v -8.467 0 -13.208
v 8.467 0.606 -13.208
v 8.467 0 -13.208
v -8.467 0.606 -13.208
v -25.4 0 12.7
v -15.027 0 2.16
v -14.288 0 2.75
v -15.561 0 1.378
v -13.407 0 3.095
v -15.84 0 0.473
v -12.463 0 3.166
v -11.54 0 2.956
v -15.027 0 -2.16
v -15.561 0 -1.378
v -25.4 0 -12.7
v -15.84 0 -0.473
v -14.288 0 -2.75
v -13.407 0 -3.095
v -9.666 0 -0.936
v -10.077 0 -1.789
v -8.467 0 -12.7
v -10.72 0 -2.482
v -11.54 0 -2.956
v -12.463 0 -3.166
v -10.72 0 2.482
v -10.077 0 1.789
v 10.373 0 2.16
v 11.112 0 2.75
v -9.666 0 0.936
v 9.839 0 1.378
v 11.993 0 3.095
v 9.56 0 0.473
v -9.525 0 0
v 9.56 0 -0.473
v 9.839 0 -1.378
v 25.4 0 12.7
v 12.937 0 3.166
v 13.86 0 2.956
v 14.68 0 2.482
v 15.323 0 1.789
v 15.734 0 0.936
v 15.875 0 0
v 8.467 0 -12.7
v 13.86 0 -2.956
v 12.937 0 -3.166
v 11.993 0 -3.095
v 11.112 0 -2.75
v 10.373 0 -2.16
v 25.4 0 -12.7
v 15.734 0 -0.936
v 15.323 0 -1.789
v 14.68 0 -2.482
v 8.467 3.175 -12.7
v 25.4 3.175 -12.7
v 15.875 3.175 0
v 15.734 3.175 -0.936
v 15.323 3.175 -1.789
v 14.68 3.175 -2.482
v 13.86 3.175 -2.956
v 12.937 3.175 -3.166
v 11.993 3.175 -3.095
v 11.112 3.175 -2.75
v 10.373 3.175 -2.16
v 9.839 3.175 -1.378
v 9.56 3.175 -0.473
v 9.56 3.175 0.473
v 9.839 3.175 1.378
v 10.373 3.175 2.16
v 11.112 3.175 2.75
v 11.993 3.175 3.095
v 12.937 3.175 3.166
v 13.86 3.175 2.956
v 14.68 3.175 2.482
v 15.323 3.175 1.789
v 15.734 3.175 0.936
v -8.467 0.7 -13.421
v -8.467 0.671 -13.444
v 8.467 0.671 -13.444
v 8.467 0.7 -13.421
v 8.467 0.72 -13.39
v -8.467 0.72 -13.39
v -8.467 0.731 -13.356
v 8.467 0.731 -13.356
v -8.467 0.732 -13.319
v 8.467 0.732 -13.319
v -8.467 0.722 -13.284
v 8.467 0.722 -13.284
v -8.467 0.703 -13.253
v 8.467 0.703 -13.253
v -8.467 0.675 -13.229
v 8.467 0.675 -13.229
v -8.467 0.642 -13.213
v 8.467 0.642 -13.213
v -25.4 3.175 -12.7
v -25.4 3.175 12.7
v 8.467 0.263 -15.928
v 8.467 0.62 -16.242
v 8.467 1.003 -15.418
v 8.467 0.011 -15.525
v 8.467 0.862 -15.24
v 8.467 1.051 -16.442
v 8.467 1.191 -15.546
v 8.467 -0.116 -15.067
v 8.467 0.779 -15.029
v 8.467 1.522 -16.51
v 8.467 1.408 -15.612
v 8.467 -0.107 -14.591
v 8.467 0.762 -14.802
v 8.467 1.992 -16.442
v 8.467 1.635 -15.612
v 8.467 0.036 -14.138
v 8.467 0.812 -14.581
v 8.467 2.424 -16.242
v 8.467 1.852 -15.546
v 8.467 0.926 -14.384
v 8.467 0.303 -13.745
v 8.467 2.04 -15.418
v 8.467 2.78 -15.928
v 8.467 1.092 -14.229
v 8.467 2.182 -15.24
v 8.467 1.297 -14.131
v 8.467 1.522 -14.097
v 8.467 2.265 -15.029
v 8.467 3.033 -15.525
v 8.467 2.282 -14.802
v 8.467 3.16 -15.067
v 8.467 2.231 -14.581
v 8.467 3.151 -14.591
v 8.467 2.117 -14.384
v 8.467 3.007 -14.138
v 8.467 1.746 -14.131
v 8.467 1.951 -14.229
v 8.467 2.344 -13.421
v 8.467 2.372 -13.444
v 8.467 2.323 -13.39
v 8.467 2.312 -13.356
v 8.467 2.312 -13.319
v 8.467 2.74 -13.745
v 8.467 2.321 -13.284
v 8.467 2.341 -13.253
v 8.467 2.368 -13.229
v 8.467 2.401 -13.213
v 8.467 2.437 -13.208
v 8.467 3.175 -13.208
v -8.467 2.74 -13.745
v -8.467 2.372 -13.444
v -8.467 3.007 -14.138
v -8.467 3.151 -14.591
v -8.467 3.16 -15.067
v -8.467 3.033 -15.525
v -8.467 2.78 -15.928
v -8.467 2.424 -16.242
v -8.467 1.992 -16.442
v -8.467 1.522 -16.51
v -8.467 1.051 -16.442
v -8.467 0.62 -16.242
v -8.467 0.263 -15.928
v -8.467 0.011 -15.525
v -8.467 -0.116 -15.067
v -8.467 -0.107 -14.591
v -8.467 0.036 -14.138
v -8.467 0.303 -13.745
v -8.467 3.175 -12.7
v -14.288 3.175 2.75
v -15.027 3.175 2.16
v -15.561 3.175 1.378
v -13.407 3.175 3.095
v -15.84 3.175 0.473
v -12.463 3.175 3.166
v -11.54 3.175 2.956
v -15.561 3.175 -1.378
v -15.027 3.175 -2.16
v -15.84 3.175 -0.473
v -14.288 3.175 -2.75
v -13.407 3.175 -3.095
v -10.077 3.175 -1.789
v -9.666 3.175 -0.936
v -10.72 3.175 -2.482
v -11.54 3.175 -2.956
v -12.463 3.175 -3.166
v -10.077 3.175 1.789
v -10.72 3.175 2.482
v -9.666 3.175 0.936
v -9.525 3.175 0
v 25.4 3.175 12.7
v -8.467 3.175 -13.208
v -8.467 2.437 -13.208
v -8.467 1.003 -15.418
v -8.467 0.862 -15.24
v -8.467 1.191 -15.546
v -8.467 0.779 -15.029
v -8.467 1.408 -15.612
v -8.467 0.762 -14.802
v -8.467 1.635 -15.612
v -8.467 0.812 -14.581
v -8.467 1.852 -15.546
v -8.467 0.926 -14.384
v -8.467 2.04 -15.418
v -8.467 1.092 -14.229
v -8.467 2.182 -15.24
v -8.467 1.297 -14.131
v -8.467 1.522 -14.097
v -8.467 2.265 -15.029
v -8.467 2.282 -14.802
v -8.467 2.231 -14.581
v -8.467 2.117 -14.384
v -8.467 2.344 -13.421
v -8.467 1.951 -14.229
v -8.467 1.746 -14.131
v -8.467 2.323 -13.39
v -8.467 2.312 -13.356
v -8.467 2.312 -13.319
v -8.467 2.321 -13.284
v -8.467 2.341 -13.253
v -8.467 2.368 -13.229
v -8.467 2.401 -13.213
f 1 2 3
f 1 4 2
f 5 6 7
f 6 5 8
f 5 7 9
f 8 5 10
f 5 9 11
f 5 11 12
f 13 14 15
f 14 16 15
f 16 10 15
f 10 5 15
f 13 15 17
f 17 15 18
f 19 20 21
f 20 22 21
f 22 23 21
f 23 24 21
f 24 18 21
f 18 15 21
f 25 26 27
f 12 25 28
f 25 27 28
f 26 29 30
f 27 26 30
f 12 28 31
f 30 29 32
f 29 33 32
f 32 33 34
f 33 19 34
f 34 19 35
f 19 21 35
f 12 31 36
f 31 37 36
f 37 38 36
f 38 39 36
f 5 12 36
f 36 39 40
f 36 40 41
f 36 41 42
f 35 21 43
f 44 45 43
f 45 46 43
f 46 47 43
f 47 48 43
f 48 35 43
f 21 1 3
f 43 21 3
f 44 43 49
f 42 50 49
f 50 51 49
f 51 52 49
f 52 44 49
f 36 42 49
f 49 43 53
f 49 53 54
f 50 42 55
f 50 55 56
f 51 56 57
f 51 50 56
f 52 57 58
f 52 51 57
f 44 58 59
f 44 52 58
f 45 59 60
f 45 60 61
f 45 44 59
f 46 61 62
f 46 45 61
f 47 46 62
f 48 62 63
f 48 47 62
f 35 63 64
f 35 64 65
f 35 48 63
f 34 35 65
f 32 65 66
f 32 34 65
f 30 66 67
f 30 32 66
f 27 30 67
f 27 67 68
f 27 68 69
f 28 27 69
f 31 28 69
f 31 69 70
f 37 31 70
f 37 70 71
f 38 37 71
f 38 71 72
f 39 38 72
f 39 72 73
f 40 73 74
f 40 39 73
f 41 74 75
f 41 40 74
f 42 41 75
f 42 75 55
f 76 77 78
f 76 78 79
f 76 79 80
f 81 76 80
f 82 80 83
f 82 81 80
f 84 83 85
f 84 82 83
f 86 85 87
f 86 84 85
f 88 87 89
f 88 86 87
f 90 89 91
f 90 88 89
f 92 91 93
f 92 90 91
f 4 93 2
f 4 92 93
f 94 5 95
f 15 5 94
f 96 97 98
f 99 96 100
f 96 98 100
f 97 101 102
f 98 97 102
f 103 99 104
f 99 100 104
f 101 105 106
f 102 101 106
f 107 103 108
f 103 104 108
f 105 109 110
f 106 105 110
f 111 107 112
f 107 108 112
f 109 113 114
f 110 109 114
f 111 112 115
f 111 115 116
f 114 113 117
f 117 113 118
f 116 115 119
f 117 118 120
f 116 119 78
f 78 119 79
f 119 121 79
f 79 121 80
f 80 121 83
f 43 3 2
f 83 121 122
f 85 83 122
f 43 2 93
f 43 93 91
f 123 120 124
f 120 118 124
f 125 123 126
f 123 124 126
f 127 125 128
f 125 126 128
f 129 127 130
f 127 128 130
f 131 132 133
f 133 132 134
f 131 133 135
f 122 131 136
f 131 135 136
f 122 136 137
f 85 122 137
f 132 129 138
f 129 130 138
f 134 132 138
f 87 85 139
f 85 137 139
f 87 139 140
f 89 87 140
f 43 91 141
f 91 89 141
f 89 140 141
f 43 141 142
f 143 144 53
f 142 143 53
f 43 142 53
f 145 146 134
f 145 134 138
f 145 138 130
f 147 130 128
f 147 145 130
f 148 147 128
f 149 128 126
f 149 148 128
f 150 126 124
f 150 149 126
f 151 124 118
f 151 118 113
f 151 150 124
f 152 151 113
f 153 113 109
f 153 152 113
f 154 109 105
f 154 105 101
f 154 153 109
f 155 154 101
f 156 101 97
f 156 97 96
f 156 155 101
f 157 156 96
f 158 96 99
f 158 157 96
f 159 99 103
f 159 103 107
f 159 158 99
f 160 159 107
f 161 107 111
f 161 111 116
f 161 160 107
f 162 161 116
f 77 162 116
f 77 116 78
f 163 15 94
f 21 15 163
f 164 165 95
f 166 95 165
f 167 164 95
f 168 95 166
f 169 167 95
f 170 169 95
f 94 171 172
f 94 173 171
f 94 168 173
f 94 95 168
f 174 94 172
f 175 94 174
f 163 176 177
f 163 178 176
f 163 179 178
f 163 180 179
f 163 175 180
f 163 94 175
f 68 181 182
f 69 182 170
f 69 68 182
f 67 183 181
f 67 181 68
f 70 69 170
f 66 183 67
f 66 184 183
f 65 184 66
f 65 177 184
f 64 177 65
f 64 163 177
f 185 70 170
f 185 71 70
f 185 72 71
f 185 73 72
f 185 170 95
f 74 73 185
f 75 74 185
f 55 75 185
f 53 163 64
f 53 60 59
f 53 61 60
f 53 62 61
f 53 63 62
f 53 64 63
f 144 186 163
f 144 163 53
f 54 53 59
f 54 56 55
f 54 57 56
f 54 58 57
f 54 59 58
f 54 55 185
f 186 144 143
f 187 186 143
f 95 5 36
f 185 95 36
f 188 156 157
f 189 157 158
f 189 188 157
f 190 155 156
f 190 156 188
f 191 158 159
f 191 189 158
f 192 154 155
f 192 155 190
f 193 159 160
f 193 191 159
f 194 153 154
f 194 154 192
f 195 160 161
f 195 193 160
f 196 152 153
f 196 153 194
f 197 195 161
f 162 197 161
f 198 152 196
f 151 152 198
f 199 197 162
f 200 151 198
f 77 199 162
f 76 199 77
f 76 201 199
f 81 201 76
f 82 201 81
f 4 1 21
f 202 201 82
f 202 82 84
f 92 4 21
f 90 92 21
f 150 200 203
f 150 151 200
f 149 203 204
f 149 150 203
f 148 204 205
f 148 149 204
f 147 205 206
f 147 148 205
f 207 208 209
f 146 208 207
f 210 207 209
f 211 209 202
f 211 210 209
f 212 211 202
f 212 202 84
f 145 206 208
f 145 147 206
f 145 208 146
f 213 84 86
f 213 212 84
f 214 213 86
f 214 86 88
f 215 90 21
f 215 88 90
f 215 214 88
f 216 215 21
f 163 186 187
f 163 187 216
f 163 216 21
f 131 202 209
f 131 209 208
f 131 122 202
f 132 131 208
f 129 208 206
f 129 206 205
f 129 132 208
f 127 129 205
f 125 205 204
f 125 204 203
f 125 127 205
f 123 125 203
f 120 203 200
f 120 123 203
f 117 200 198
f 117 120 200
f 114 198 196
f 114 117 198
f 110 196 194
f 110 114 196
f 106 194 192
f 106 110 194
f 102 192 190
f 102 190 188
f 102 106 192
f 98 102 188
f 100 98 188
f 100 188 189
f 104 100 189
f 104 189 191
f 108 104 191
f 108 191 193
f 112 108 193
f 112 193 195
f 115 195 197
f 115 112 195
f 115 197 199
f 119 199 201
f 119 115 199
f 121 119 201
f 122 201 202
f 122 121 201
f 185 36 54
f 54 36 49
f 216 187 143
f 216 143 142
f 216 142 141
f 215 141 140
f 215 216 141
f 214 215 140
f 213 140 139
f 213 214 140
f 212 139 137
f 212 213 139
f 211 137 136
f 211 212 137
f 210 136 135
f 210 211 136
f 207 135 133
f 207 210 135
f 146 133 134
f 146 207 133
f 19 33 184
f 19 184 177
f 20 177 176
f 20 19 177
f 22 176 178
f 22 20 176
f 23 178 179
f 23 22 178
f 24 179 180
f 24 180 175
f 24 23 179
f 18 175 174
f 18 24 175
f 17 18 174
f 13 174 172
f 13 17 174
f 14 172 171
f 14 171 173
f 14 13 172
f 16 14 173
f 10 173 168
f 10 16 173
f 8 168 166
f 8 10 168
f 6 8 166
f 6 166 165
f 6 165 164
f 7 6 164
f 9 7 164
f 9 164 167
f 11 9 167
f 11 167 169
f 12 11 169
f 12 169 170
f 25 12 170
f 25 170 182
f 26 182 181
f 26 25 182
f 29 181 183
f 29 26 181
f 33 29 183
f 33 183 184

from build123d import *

# Parameters (mm, degrees)
CROQUIS3_W              = 50.8
CROQUIS3_H              = 25.4
CROQUIS3_R              = 3.175
SALIENTE_EXTRUIR1_DEPTH = 3.175
CROQUIS6_R              = 0.762
SALIENTE_EXTRUIR3_DEPTH = 8.466666667


with BuildPart() as part:
    # Croquis3 → Saliente-Extruir1 (new body)
    with BuildSketch(Plane(origin=(0, 0, 0), x_dir=(1, 0, 0), z_dir=(0, 1, 0))):
        Rectangle(CROQUIS3_W, CROQUIS3_H)
        with Locations((-12.7, 0)):
            Circle(CROQUIS3_R, mode=Mode.SUBTRACT)
        with Locations((12.7, 0)):
            Circle(CROQUIS3_R, mode=Mode.SUBTRACT)
    extrude(amount=SALIENTE_EXTRUIR1_DEPTH)

    # Croquis6 → Saliente-Extruir3 (add, symmetric)
    with BuildSketch(Plane.ZY):
        with BuildLine():
            Line((-12.7, 3.175), (-13.208, 3.175))
            Line((-13.208, 3.175), (-13.208, 2.437497499))
            ThreePointArc((-13.208, 2.437497499), (-13.301057822, 2.315117237), (-13.443857143, 2.372082497))
            ThreePointArc((-13.443857143, 2.372082497), (-16.51, 1.521687475), (-13.443857143, 0.671292453))
            ThreePointArc((-13.443857143, 0.671292453), (-13.301057822, 0.728257713), (-13.208, 0.605877451))
            Line((-13.208, 0.605877451), (-13.208, 0))
            Line((-13.208, 0), (-12.7, 0))
            Line((-12.7, 0), (-12.7, 3.175))
        make_face()
        with Locations((-14.859, 1.521687475)):
            Circle(CROQUIS6_R, mode=Mode.SUBTRACT)
    extrude(amount=SALIENTE_EXTRUIR3_DEPTH, both=True)


solid = part.part
